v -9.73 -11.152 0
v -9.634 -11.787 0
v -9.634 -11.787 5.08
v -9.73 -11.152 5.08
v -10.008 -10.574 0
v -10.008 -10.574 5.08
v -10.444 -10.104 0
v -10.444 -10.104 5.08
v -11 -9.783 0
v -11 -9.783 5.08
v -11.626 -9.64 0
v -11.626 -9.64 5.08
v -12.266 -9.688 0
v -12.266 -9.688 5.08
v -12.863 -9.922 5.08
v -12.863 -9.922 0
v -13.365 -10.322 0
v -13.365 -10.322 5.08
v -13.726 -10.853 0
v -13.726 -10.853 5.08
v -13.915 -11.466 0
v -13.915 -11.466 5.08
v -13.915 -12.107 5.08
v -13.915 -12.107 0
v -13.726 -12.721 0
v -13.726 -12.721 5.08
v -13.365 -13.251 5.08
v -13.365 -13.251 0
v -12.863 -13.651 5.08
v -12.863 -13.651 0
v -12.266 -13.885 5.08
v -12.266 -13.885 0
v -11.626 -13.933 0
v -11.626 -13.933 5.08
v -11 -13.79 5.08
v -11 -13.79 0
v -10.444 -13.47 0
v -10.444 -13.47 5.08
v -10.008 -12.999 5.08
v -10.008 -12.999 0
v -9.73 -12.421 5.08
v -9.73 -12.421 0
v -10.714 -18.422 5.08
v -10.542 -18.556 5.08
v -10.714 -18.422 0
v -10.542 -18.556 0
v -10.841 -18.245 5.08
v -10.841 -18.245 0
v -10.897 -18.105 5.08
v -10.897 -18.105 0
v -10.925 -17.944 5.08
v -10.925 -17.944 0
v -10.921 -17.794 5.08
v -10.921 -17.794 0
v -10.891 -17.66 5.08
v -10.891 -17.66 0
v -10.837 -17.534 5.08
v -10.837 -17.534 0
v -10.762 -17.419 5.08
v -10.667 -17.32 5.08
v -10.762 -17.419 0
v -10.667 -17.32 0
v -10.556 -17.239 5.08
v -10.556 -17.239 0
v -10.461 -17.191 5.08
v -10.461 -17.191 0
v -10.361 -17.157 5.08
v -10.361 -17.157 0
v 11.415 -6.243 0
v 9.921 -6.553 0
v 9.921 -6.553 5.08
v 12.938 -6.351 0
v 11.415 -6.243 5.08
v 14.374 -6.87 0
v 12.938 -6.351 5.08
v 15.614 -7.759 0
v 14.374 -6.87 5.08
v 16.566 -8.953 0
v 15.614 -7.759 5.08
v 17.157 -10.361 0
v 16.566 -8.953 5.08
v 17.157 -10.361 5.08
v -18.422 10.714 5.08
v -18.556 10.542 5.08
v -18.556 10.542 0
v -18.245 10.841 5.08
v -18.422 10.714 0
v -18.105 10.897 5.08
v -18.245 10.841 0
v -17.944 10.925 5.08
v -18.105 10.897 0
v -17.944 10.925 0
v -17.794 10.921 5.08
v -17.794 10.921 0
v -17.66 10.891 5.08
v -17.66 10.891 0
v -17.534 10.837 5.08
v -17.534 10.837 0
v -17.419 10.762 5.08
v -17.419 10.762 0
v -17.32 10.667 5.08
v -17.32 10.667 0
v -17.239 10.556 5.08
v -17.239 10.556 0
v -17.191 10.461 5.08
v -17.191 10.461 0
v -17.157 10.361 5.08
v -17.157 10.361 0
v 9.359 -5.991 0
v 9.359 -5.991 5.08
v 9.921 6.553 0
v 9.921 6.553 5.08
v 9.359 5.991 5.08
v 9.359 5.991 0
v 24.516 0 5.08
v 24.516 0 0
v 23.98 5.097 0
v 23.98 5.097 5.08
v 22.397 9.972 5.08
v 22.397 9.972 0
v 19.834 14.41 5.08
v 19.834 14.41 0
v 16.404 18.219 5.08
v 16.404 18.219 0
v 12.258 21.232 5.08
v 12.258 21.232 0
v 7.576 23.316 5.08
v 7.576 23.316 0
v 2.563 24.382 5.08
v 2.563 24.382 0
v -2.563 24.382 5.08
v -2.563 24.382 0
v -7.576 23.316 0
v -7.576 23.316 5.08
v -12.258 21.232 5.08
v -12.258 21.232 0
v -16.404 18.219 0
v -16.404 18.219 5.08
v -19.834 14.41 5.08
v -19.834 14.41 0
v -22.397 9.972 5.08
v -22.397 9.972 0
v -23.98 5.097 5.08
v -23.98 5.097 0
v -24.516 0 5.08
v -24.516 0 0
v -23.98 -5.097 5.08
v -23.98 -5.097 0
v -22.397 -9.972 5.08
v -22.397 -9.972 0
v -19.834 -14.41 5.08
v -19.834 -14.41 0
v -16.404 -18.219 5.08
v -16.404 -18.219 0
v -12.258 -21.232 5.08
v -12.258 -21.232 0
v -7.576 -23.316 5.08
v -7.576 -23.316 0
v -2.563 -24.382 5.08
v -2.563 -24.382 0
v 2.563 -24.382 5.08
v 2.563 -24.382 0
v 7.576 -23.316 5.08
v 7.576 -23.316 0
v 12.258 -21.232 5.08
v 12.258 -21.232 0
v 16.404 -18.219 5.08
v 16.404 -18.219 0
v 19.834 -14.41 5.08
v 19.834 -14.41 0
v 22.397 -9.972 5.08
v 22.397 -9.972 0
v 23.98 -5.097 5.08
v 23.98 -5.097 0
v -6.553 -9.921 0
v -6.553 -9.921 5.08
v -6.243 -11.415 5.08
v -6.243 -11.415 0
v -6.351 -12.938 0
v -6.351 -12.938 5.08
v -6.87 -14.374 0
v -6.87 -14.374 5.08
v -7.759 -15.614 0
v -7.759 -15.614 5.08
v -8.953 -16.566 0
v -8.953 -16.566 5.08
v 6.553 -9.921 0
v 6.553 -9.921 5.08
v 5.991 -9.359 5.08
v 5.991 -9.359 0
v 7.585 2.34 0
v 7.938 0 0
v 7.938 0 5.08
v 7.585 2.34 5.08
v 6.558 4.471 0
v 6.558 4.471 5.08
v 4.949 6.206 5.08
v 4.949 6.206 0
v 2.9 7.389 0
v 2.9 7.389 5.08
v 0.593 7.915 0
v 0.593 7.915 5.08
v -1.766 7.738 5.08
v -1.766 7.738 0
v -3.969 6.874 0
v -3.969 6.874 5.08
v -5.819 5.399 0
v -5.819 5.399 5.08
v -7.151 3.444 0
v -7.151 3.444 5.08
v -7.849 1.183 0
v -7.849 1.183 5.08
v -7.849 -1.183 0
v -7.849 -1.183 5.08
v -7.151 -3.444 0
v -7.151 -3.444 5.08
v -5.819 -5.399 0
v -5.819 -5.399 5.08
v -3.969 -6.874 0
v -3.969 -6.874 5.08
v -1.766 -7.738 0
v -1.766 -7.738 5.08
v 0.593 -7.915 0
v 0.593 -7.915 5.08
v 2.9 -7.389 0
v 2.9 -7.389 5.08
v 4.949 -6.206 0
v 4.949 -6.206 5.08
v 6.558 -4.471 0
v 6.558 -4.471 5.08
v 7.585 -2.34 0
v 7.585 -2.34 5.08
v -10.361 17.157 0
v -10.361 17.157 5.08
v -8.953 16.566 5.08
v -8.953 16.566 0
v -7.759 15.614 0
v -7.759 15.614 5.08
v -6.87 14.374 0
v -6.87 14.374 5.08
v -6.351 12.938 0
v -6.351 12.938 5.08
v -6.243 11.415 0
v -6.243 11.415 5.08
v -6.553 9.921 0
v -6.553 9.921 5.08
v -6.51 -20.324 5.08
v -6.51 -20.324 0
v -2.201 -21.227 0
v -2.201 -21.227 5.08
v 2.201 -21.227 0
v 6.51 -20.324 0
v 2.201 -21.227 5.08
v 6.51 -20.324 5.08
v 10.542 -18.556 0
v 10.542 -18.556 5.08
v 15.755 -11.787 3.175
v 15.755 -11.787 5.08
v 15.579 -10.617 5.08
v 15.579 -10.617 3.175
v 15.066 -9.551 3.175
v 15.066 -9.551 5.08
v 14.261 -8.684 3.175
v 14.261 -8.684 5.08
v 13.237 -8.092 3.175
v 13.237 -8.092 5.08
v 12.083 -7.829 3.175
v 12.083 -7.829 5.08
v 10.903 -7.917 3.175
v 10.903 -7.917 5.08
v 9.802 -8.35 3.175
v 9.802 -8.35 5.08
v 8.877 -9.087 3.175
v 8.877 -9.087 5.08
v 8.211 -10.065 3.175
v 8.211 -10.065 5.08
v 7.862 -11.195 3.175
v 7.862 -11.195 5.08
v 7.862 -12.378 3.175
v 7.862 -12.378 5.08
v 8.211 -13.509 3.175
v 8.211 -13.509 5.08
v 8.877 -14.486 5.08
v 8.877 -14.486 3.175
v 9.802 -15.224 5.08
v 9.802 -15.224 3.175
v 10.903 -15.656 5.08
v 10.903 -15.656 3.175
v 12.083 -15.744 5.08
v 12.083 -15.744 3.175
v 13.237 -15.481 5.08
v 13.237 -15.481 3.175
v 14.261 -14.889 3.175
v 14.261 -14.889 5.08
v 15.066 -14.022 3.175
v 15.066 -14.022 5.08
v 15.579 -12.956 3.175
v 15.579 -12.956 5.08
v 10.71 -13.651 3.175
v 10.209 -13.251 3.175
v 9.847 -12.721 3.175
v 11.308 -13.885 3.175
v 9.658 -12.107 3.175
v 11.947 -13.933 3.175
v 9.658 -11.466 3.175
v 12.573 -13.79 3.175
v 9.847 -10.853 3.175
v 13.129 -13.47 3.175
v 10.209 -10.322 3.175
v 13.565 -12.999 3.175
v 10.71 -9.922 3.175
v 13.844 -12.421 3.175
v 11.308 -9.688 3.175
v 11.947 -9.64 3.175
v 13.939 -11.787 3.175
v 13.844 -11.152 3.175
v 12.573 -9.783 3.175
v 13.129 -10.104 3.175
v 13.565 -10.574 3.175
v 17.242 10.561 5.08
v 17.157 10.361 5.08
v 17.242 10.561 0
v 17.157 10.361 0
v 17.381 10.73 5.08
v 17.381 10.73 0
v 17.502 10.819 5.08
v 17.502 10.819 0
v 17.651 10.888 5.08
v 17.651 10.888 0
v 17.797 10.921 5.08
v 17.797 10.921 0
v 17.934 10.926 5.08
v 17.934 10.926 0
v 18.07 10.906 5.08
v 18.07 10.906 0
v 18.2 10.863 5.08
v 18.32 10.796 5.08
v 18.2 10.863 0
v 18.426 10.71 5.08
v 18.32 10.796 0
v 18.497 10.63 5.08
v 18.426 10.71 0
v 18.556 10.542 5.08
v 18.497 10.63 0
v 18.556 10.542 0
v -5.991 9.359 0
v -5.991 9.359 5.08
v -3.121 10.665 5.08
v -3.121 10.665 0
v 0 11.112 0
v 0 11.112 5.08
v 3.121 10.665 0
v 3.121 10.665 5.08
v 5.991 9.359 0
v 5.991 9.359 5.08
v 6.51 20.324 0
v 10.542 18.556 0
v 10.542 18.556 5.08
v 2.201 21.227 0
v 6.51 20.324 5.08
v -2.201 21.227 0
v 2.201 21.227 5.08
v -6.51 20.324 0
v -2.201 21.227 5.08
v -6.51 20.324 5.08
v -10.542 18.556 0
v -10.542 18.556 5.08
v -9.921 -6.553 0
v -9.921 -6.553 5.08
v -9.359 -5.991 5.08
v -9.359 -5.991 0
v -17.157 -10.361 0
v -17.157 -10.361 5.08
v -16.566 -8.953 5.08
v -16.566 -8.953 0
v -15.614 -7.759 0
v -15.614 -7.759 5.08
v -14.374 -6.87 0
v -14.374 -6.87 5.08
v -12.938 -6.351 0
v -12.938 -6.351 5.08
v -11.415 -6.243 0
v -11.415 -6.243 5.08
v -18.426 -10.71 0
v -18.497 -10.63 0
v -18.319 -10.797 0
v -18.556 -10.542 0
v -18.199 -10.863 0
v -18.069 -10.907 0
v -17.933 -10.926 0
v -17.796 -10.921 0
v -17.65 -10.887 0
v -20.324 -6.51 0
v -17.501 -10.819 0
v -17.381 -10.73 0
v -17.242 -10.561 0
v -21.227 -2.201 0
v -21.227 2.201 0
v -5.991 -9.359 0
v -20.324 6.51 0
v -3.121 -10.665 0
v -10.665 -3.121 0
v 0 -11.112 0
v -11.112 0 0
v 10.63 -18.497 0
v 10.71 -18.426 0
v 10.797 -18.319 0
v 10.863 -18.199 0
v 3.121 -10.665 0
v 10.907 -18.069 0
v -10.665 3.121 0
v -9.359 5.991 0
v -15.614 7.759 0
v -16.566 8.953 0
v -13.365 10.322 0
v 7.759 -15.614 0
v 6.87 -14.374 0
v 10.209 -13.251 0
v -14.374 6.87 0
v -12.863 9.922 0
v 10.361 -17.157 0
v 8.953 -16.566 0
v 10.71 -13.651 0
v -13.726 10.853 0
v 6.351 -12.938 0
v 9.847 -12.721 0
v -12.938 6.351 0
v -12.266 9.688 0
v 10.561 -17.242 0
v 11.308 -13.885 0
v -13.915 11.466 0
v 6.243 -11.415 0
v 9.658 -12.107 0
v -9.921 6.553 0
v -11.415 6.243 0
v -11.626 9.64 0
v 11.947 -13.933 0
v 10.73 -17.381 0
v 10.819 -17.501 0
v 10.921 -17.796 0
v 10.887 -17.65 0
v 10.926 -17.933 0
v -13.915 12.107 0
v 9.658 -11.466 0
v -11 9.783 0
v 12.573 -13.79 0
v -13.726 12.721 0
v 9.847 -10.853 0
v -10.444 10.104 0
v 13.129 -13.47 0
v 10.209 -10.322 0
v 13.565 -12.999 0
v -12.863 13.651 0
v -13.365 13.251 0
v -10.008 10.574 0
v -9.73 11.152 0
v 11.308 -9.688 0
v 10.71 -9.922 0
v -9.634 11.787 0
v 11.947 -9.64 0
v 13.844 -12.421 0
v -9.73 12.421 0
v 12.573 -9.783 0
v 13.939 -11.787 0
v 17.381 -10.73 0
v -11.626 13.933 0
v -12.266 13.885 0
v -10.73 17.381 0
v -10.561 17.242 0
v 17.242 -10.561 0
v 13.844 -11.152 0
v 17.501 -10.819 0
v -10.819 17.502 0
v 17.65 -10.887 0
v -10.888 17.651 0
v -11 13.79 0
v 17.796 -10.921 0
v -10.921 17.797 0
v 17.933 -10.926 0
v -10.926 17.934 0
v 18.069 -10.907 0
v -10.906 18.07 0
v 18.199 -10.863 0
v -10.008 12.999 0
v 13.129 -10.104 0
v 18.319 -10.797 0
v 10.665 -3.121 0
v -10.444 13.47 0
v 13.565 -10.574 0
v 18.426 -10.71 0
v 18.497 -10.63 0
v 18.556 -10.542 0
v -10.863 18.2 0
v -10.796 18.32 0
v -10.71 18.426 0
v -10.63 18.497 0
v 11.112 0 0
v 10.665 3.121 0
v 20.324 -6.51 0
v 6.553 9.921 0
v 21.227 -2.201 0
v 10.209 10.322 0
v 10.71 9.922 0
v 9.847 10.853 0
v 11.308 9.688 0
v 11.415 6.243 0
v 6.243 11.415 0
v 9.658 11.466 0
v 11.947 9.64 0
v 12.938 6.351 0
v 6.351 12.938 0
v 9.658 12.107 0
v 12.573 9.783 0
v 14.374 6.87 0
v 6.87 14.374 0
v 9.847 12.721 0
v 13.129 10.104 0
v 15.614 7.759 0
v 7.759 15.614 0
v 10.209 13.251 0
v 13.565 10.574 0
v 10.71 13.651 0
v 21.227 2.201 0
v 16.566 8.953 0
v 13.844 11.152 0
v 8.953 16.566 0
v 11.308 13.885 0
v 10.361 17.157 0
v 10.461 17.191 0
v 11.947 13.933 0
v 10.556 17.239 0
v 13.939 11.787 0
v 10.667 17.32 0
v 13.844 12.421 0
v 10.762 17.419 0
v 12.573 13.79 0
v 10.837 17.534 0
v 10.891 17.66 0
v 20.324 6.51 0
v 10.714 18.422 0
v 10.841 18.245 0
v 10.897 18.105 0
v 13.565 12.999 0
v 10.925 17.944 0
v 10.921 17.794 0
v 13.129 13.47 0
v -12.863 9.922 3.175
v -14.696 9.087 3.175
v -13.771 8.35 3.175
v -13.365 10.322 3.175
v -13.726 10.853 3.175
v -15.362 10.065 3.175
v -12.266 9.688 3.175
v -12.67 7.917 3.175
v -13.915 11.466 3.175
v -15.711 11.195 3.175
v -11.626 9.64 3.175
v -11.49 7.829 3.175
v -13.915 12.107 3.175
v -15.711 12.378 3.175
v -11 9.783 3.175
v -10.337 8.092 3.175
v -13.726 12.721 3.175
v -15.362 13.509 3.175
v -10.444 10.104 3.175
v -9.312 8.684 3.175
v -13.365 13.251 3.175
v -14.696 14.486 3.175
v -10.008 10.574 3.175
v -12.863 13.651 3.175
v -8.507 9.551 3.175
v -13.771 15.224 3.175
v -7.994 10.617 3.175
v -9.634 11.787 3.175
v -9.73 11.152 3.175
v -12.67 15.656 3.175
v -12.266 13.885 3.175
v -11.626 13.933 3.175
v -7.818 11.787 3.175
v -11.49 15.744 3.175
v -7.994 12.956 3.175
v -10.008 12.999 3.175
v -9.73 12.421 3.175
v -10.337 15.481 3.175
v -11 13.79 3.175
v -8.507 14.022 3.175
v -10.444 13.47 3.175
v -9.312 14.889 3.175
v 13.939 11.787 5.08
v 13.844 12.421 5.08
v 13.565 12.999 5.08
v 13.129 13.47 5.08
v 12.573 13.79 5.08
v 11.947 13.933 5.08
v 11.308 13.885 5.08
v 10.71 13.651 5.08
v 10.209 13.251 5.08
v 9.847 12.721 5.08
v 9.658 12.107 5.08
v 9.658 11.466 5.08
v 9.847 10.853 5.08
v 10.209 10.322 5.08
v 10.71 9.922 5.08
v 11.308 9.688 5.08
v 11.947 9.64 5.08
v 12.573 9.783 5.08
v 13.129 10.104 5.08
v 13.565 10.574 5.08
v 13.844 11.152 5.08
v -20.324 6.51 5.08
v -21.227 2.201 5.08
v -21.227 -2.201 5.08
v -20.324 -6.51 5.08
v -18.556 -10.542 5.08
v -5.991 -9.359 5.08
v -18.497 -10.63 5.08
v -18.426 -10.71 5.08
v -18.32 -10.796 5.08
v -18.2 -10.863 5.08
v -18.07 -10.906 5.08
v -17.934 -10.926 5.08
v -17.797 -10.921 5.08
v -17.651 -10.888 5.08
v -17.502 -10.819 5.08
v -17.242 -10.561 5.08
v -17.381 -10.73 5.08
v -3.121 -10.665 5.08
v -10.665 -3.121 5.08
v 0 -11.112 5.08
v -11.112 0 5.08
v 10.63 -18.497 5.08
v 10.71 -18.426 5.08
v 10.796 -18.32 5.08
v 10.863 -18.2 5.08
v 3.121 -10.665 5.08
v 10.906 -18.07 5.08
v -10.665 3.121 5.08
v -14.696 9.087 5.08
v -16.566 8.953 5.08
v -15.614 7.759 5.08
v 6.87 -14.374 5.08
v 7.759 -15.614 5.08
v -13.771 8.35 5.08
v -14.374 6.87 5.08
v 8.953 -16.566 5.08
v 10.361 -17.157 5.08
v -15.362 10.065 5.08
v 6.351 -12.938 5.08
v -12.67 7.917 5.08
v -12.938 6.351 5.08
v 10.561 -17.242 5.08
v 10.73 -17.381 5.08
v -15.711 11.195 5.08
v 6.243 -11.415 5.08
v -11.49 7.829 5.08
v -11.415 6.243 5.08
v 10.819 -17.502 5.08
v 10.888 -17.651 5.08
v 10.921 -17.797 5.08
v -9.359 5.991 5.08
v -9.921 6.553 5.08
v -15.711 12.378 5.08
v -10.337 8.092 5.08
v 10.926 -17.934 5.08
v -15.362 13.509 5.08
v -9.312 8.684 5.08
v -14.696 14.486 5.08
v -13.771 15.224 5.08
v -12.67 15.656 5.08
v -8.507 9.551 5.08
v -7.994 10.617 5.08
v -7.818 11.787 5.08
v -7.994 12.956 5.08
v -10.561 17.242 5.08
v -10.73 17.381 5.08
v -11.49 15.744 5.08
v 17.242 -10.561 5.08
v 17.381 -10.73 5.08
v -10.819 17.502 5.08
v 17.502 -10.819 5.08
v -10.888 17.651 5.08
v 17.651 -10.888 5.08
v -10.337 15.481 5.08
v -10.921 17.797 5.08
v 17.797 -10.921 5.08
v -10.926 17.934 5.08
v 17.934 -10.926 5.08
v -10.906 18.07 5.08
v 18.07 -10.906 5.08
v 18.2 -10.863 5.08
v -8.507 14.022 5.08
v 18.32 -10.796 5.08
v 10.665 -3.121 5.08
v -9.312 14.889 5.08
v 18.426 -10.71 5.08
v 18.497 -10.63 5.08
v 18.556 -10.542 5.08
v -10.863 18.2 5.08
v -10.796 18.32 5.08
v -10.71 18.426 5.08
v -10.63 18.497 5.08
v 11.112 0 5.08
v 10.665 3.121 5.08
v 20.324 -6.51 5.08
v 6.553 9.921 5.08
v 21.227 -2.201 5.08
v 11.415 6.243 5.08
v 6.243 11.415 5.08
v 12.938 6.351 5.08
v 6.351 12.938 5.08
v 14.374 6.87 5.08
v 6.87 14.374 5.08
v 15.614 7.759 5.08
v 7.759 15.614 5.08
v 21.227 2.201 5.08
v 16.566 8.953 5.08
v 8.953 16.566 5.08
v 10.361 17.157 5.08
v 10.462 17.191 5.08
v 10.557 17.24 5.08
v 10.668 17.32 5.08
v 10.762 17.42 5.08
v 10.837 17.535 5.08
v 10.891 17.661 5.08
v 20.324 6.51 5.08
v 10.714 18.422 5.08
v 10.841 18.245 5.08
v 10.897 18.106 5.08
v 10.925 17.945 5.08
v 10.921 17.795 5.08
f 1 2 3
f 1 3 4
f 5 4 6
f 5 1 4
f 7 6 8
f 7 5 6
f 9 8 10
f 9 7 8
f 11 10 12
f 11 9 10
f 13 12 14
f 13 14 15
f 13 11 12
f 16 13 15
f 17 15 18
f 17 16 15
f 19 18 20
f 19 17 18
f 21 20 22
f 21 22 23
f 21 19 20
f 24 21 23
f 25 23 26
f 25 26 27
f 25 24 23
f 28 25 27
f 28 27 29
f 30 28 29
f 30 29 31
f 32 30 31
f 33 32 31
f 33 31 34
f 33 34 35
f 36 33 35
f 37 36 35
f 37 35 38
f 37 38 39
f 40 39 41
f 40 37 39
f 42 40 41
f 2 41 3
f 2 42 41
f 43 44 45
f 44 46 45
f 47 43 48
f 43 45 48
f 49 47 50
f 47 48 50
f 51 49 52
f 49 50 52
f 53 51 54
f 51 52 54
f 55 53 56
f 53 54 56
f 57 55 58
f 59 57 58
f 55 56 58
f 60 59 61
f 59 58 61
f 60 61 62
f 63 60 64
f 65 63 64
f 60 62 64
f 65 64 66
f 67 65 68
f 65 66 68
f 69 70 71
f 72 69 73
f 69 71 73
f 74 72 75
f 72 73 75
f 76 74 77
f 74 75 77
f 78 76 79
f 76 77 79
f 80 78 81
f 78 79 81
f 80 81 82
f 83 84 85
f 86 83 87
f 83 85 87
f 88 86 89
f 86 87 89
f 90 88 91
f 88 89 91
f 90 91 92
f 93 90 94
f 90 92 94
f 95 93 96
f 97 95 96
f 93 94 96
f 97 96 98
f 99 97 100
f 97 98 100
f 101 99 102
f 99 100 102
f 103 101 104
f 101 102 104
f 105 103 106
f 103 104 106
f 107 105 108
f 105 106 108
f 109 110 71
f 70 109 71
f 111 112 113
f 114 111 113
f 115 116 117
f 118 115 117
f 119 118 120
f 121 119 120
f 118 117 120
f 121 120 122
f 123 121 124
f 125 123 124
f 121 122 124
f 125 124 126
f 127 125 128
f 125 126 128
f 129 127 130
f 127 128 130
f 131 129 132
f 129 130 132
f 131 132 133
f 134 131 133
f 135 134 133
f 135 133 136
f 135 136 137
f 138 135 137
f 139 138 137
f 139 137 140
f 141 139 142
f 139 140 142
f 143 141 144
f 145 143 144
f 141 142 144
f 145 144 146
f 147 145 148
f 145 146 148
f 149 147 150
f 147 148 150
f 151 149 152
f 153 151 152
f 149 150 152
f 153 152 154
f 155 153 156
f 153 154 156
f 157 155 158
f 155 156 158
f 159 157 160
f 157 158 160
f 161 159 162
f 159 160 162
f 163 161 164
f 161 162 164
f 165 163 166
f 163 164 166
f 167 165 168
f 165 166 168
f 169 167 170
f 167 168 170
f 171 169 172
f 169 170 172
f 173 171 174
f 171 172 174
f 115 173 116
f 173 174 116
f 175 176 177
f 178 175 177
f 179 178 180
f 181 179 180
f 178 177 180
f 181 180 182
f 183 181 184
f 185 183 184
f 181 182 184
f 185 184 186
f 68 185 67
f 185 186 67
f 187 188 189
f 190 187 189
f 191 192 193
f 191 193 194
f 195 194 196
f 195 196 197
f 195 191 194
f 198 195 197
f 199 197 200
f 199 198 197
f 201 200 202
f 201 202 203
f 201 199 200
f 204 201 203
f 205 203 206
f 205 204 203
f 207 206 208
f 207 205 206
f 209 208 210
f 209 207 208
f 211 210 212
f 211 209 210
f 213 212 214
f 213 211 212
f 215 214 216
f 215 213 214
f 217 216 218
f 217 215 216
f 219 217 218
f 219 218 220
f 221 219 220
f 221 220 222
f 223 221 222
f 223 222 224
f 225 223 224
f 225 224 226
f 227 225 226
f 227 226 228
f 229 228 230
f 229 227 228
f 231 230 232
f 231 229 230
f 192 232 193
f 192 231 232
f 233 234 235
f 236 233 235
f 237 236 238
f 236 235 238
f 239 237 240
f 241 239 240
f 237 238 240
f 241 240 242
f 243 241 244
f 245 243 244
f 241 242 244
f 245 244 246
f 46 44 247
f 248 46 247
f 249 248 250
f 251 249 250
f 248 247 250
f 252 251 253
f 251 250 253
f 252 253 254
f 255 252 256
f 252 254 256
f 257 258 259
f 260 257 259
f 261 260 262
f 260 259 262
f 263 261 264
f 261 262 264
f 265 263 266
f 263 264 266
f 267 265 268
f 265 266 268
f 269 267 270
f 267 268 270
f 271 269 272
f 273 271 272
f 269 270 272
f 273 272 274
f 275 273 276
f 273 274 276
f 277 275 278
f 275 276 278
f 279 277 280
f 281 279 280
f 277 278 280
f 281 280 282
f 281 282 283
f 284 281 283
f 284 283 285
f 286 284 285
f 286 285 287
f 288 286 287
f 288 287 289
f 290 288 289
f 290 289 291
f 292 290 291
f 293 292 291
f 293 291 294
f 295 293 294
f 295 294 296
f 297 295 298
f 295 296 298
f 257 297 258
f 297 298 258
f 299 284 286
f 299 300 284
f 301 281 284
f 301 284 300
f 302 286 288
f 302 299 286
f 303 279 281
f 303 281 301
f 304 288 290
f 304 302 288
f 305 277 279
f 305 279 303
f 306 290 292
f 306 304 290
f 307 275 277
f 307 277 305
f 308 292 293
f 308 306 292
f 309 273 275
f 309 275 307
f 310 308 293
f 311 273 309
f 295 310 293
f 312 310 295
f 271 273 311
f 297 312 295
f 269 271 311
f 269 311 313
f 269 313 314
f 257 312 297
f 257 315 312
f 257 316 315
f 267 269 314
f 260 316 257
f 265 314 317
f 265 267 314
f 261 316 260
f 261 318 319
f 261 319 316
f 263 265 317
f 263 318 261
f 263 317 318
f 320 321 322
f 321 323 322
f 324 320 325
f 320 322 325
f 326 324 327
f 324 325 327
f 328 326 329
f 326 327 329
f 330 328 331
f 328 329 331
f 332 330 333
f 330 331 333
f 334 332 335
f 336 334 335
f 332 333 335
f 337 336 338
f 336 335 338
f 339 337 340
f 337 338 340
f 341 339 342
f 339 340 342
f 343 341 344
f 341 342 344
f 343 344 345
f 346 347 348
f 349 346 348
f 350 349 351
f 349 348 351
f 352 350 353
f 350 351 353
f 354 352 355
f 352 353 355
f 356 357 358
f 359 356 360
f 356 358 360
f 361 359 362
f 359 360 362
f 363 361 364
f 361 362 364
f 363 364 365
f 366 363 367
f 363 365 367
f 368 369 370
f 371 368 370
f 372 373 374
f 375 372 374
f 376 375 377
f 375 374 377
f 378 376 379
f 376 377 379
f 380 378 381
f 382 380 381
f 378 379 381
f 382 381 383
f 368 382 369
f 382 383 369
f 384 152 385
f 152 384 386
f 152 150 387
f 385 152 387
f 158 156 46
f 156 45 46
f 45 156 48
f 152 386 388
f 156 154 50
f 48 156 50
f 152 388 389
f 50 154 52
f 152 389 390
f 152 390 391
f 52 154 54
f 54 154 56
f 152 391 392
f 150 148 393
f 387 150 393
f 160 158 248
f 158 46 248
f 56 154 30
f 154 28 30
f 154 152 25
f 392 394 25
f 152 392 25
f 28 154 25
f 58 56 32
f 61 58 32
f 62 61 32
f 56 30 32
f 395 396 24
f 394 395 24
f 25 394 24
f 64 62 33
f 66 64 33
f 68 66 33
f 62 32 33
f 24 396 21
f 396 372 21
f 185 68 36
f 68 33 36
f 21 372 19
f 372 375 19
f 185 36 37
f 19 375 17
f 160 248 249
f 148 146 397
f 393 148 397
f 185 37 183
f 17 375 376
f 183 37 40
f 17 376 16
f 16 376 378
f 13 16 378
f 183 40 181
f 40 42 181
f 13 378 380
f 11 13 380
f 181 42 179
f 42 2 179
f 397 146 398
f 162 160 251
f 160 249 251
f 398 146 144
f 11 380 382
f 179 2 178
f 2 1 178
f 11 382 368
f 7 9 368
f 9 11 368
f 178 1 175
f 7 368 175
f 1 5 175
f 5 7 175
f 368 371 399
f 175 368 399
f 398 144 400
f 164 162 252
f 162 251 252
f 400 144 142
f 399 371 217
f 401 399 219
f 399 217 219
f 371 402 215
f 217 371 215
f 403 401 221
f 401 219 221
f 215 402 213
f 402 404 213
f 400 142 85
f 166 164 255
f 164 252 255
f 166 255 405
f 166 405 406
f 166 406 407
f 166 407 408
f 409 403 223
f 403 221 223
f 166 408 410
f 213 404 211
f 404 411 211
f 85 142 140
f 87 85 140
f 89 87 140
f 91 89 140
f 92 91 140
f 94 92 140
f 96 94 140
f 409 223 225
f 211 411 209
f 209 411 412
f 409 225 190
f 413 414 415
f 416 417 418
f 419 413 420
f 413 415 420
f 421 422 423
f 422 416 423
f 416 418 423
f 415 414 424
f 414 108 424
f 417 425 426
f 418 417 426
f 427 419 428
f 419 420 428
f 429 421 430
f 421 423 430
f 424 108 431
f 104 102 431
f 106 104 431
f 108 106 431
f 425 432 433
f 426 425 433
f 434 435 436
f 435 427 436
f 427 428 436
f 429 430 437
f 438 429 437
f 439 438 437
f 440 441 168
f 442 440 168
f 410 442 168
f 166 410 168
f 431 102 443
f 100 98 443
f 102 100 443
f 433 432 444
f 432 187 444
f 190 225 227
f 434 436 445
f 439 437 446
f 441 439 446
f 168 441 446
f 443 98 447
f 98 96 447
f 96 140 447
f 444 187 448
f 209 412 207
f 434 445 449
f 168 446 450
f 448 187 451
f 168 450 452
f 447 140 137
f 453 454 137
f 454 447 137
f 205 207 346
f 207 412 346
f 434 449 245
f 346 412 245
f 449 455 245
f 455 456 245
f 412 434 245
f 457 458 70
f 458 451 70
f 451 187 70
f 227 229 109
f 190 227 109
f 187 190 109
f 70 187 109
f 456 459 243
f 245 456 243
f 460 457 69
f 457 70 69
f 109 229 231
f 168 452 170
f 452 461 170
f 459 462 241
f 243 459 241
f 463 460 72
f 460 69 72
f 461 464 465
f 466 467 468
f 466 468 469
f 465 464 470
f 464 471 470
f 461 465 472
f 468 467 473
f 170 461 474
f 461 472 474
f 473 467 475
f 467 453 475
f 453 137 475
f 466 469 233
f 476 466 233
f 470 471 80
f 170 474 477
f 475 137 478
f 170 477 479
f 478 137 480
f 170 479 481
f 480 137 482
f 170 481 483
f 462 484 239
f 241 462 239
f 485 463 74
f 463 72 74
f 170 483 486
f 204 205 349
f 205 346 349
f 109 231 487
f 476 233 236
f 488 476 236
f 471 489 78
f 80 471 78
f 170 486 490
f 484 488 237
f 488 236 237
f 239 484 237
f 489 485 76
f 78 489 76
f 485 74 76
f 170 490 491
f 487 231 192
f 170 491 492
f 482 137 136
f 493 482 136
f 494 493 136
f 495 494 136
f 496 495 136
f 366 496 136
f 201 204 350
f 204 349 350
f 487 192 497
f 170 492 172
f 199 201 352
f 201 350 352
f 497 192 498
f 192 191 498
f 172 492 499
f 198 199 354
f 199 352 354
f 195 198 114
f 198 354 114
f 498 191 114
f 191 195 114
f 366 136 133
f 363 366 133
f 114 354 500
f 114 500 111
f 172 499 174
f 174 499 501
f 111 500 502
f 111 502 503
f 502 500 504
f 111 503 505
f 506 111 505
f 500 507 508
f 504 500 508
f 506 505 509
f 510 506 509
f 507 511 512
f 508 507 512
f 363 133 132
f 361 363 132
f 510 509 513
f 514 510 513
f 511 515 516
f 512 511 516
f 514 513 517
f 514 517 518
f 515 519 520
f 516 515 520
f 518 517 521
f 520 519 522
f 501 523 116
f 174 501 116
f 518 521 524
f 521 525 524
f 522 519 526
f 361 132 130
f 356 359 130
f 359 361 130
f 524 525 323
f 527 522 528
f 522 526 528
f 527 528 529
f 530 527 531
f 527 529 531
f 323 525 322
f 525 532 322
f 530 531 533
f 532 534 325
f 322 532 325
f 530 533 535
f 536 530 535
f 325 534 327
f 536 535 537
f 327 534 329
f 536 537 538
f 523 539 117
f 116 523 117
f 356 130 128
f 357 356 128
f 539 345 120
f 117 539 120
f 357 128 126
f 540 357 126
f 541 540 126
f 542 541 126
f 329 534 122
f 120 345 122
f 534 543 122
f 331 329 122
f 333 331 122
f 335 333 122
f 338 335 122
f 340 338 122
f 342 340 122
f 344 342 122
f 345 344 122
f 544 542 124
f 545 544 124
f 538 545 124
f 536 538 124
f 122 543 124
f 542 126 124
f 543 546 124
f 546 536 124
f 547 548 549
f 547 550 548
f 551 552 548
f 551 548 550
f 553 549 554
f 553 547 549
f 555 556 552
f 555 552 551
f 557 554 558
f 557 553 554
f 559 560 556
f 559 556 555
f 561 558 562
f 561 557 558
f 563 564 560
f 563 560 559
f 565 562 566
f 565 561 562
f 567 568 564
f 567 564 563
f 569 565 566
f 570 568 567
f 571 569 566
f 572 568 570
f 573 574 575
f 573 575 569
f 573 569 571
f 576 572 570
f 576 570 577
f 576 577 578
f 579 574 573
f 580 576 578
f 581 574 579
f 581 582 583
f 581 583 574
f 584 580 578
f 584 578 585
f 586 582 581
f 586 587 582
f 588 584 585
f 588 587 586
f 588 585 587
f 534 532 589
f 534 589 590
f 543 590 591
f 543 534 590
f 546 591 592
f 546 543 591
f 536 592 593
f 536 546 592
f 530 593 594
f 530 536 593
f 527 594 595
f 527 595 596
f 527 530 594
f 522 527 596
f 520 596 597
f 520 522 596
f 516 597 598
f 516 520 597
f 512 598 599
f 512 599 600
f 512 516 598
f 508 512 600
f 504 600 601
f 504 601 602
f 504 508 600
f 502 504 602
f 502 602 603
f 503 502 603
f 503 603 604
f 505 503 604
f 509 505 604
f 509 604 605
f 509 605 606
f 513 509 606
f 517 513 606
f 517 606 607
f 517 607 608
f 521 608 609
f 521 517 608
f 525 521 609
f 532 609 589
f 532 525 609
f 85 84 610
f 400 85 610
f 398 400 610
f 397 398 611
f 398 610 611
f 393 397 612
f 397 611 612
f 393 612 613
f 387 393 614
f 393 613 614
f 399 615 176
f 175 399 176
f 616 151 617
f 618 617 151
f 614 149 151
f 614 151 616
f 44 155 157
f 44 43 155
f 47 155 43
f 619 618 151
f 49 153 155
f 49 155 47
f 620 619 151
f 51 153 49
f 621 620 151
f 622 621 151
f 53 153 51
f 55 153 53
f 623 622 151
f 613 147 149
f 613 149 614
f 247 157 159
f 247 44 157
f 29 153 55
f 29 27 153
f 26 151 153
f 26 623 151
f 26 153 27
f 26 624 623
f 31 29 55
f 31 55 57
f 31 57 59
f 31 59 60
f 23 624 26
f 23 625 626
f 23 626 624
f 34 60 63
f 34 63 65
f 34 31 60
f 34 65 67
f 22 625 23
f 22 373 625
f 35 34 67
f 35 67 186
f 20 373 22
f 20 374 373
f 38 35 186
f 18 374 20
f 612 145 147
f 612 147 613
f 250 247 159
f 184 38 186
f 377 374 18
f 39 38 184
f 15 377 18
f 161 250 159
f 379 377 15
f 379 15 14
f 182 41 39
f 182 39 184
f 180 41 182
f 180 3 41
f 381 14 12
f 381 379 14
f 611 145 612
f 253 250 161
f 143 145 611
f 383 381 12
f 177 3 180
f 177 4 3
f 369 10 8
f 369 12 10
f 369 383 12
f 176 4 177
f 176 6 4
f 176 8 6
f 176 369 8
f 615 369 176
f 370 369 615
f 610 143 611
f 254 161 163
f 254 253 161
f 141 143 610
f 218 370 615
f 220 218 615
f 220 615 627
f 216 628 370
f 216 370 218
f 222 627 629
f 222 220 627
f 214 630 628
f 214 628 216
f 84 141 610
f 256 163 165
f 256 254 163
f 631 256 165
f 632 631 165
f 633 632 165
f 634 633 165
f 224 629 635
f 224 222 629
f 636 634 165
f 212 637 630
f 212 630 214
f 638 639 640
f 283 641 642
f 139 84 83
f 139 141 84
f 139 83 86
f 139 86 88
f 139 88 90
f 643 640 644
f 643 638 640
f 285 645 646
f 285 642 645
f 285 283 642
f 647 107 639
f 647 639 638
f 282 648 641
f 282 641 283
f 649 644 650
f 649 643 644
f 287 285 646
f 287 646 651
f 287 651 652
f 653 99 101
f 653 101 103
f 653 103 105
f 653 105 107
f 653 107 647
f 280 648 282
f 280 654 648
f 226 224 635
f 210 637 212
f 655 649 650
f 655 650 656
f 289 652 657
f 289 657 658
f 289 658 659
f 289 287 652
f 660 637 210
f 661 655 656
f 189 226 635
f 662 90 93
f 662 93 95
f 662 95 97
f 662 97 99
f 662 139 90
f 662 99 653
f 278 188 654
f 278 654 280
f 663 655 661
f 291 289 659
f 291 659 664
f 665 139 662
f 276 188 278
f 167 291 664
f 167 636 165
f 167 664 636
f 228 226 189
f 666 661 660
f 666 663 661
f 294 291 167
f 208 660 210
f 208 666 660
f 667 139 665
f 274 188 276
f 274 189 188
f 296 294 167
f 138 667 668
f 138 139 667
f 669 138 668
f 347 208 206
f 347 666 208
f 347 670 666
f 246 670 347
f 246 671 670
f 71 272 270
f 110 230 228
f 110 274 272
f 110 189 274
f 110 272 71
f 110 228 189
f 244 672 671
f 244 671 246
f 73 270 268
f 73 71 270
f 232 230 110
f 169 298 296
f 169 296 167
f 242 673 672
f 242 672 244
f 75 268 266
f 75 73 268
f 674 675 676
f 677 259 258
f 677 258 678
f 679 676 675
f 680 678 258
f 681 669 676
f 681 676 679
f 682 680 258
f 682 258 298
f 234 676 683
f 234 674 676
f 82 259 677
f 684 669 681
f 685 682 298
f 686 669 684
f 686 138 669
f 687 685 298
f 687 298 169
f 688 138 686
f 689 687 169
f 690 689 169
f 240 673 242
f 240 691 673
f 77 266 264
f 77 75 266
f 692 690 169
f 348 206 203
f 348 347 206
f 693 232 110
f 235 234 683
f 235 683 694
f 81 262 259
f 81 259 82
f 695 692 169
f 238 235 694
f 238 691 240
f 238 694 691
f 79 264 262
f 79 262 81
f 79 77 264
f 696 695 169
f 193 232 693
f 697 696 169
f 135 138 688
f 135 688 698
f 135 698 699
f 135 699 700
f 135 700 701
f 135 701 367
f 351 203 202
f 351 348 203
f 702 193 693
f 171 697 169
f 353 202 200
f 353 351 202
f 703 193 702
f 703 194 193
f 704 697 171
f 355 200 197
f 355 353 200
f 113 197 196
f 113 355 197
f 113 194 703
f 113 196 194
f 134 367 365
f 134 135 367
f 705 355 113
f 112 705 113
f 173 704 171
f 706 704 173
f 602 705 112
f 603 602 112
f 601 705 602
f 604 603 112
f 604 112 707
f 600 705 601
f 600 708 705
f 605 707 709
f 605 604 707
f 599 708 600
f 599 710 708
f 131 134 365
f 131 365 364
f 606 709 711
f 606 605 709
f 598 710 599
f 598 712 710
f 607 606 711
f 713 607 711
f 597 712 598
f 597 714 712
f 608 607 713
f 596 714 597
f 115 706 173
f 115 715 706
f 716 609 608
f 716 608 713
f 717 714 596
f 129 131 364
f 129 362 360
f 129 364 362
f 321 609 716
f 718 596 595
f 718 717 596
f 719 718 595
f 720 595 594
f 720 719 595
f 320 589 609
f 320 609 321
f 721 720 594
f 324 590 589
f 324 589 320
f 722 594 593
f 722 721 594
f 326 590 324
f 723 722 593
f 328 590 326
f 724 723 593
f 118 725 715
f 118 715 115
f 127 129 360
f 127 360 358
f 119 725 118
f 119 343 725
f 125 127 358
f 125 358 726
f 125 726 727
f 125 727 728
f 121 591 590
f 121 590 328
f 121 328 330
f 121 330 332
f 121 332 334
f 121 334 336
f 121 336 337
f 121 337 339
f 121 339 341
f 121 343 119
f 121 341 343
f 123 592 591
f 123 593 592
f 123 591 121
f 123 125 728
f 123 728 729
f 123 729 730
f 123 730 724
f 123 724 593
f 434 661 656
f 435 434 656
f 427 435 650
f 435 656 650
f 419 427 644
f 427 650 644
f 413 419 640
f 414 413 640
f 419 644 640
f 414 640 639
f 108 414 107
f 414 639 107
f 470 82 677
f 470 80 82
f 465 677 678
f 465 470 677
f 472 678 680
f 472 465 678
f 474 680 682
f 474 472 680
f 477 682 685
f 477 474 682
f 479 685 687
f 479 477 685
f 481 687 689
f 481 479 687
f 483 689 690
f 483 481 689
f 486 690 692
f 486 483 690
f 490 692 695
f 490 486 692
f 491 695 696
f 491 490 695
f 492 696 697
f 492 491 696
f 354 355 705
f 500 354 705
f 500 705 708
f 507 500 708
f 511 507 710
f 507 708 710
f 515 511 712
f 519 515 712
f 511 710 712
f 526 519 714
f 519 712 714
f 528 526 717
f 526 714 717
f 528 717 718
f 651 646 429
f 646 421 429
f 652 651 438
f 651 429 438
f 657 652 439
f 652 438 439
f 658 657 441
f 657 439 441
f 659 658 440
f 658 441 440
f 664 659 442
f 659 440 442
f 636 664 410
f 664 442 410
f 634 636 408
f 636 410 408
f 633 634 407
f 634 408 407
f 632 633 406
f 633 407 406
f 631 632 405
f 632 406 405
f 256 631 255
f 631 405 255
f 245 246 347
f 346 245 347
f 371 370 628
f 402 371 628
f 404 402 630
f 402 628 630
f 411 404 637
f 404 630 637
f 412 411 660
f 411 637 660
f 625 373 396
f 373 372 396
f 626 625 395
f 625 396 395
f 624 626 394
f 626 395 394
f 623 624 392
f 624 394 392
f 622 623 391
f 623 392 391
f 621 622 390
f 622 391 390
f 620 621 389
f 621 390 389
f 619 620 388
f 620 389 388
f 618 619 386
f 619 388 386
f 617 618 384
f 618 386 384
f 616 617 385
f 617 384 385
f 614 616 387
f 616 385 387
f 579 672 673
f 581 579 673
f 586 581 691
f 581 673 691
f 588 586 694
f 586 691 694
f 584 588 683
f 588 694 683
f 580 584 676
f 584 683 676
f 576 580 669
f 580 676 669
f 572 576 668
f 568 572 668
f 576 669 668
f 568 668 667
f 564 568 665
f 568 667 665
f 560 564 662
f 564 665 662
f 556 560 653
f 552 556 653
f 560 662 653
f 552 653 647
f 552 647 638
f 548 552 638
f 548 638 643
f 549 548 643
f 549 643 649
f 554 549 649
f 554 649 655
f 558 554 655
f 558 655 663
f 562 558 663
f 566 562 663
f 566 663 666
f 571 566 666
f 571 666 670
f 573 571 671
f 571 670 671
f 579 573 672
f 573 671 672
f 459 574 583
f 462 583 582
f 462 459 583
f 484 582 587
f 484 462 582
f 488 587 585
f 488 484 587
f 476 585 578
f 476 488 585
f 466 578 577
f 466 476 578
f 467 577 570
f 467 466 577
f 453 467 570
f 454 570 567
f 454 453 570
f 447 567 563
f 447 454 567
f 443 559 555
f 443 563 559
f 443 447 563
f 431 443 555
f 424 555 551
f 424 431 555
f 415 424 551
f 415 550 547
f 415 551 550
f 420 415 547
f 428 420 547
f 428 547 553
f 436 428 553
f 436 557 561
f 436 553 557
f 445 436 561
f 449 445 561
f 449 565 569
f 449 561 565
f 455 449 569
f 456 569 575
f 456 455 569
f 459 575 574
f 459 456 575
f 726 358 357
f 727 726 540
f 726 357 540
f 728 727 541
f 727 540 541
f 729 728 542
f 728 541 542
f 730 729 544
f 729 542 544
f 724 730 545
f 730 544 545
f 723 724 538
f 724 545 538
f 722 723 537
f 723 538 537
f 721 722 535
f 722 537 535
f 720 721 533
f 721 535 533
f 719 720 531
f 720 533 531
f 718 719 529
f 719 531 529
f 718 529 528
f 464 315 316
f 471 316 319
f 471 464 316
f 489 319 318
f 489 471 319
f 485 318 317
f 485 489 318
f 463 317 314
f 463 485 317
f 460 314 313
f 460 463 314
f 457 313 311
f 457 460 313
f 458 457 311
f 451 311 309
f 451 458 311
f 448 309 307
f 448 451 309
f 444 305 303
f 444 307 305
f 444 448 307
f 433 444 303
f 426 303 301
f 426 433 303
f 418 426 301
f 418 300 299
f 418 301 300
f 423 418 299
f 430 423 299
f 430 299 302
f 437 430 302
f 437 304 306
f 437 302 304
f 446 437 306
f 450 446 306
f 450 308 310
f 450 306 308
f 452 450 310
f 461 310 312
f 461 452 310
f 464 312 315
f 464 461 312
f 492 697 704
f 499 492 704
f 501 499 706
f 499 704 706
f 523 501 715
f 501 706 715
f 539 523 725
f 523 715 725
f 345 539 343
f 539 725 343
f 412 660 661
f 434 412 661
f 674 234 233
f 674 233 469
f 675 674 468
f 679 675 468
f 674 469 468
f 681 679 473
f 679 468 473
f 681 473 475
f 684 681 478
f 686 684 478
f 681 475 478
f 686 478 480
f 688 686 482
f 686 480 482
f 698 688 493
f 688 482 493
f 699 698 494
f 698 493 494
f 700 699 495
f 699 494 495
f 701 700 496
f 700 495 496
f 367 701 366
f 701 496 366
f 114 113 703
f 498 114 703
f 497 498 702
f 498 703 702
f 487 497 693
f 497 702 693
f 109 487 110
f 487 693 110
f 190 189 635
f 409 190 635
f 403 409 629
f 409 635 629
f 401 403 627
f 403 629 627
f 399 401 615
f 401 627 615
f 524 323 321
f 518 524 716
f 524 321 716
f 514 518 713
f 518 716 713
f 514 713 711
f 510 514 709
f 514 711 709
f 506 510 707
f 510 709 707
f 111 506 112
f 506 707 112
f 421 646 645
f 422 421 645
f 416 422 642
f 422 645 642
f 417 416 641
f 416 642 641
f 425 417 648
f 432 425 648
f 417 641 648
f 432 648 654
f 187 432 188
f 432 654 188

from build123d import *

# Parameters (mm, degrees)
F0_R            = 24.51608
F0_R_2          = 2.15265
F0_R_3          = 7.9375
F1_DEPTH        = 5.08
F3_DEPTH        = 5.08
F3_COPIES_COUNT = 4
F4_R            = 0.762
F5_R            = 3.96875
F6_DEPTH        = 1.905


# Not quite as in the source:
# - a pattern or mirror of a feature is missing from the dataset's text; its kind, count and spacing are read off the source's solid


with BuildPart() as f1:
    # F0 (on Top) → F1 (new body)
    with BuildSketch(Plane.XY):
        Circle(F0_R)
        with Locations((-11.7865906, -11.7865906)):
            Circle(F0_R_2, mode=Mode.SUBTRACT)
        with Locations((11.7865906, -11.7865906)):
            Circle(F0_R_2, mode=Mode.SUBTRACT)
        with Locations((-11.7865906, 11.7865906)):
            Circle(F0_R_2, mode=Mode.SUBTRACT)
        Circle(F0_R_3, mode=Mode.SUBTRACT)
        with Locations((11.7865906, 11.7865906)):
            Circle(F0_R_2, mode=Mode.SUBTRACT)
    extrude(amount=F1_DEPTH)

    # F2 (on face) → F3 (cut, through all)
    with BuildSketch(Plane.XY.offset(5.08)):
        with BuildLine():
            ThreePointArc((-12.5005198818, 17.2967828873), (-7.4612395718, 15.2741760893), (-6.553034663, 9.9206307084))
            Line((-6.553034663, 9.9206307084), (-5.9913991959, 9.3589952413))
            ThreePointArc((-5.9913991959, 9.3589952413), (0, 11.1125), (5.9913991959, 9.3589952413))
            Line((5.9913991959, 9.3589952413), (6.553034663, 9.9206307084))
            ThreePointArc((6.553034663, 9.9206307084), (7.4612395718, 15.2741760893), (12.5005198818, 17.2967828873))
            ThreePointArc((12.5005198818, 17.2967828873), (0, 21.34108), (-12.5005198818, 17.2967828873))
        make_face()
    f3 = extrude(amount=-F3_DEPTH, mode=Mode.SUBTRACT)

    # F3_copies: F3 ×4 about axis
    f3_copies_axis = Axis((0, 0, 0), (0, 0, 1))
    for i in range(1, F3_COPIES_COUNT):
        add(f3.rotate(f3_copies_axis, i * 360 / F3_COPIES_COUNT), mode=Mode.SUBTRACT)

    # F4
    f4_edges = [f1.edges().sort_by_distance(p)[0] for p in [
        (-12.50052, 17.296783, 2.54),
        (12.50052, 17.296783, 2.54),
        (-17.296783, -12.50052, 2.54),
        (-17.296783, 12.50052, 2.54),
        (12.50052, -17.296783, 2.54),
        (-12.50052, -17.296783, 2.54),
        (17.296783, 12.50052, 2.54),
        (17.296783, -12.50052, 2.54),
    ]]
    fillet(f4_edges, radius=F4_R)

    # F5 (on face) → F6 (cut)
    with BuildSketch(Plane.XY.offset(5.08)):
        with Locations((-11.7865906, 11.7865906)):
            Circle(F5_R)
        with Locations((11.7865906, -11.7865906)):
            Circle(F5_R)
    extrude(amount=-F6_DEPTH, mode=Mode.SUBTRACT)


solid = f1.part
